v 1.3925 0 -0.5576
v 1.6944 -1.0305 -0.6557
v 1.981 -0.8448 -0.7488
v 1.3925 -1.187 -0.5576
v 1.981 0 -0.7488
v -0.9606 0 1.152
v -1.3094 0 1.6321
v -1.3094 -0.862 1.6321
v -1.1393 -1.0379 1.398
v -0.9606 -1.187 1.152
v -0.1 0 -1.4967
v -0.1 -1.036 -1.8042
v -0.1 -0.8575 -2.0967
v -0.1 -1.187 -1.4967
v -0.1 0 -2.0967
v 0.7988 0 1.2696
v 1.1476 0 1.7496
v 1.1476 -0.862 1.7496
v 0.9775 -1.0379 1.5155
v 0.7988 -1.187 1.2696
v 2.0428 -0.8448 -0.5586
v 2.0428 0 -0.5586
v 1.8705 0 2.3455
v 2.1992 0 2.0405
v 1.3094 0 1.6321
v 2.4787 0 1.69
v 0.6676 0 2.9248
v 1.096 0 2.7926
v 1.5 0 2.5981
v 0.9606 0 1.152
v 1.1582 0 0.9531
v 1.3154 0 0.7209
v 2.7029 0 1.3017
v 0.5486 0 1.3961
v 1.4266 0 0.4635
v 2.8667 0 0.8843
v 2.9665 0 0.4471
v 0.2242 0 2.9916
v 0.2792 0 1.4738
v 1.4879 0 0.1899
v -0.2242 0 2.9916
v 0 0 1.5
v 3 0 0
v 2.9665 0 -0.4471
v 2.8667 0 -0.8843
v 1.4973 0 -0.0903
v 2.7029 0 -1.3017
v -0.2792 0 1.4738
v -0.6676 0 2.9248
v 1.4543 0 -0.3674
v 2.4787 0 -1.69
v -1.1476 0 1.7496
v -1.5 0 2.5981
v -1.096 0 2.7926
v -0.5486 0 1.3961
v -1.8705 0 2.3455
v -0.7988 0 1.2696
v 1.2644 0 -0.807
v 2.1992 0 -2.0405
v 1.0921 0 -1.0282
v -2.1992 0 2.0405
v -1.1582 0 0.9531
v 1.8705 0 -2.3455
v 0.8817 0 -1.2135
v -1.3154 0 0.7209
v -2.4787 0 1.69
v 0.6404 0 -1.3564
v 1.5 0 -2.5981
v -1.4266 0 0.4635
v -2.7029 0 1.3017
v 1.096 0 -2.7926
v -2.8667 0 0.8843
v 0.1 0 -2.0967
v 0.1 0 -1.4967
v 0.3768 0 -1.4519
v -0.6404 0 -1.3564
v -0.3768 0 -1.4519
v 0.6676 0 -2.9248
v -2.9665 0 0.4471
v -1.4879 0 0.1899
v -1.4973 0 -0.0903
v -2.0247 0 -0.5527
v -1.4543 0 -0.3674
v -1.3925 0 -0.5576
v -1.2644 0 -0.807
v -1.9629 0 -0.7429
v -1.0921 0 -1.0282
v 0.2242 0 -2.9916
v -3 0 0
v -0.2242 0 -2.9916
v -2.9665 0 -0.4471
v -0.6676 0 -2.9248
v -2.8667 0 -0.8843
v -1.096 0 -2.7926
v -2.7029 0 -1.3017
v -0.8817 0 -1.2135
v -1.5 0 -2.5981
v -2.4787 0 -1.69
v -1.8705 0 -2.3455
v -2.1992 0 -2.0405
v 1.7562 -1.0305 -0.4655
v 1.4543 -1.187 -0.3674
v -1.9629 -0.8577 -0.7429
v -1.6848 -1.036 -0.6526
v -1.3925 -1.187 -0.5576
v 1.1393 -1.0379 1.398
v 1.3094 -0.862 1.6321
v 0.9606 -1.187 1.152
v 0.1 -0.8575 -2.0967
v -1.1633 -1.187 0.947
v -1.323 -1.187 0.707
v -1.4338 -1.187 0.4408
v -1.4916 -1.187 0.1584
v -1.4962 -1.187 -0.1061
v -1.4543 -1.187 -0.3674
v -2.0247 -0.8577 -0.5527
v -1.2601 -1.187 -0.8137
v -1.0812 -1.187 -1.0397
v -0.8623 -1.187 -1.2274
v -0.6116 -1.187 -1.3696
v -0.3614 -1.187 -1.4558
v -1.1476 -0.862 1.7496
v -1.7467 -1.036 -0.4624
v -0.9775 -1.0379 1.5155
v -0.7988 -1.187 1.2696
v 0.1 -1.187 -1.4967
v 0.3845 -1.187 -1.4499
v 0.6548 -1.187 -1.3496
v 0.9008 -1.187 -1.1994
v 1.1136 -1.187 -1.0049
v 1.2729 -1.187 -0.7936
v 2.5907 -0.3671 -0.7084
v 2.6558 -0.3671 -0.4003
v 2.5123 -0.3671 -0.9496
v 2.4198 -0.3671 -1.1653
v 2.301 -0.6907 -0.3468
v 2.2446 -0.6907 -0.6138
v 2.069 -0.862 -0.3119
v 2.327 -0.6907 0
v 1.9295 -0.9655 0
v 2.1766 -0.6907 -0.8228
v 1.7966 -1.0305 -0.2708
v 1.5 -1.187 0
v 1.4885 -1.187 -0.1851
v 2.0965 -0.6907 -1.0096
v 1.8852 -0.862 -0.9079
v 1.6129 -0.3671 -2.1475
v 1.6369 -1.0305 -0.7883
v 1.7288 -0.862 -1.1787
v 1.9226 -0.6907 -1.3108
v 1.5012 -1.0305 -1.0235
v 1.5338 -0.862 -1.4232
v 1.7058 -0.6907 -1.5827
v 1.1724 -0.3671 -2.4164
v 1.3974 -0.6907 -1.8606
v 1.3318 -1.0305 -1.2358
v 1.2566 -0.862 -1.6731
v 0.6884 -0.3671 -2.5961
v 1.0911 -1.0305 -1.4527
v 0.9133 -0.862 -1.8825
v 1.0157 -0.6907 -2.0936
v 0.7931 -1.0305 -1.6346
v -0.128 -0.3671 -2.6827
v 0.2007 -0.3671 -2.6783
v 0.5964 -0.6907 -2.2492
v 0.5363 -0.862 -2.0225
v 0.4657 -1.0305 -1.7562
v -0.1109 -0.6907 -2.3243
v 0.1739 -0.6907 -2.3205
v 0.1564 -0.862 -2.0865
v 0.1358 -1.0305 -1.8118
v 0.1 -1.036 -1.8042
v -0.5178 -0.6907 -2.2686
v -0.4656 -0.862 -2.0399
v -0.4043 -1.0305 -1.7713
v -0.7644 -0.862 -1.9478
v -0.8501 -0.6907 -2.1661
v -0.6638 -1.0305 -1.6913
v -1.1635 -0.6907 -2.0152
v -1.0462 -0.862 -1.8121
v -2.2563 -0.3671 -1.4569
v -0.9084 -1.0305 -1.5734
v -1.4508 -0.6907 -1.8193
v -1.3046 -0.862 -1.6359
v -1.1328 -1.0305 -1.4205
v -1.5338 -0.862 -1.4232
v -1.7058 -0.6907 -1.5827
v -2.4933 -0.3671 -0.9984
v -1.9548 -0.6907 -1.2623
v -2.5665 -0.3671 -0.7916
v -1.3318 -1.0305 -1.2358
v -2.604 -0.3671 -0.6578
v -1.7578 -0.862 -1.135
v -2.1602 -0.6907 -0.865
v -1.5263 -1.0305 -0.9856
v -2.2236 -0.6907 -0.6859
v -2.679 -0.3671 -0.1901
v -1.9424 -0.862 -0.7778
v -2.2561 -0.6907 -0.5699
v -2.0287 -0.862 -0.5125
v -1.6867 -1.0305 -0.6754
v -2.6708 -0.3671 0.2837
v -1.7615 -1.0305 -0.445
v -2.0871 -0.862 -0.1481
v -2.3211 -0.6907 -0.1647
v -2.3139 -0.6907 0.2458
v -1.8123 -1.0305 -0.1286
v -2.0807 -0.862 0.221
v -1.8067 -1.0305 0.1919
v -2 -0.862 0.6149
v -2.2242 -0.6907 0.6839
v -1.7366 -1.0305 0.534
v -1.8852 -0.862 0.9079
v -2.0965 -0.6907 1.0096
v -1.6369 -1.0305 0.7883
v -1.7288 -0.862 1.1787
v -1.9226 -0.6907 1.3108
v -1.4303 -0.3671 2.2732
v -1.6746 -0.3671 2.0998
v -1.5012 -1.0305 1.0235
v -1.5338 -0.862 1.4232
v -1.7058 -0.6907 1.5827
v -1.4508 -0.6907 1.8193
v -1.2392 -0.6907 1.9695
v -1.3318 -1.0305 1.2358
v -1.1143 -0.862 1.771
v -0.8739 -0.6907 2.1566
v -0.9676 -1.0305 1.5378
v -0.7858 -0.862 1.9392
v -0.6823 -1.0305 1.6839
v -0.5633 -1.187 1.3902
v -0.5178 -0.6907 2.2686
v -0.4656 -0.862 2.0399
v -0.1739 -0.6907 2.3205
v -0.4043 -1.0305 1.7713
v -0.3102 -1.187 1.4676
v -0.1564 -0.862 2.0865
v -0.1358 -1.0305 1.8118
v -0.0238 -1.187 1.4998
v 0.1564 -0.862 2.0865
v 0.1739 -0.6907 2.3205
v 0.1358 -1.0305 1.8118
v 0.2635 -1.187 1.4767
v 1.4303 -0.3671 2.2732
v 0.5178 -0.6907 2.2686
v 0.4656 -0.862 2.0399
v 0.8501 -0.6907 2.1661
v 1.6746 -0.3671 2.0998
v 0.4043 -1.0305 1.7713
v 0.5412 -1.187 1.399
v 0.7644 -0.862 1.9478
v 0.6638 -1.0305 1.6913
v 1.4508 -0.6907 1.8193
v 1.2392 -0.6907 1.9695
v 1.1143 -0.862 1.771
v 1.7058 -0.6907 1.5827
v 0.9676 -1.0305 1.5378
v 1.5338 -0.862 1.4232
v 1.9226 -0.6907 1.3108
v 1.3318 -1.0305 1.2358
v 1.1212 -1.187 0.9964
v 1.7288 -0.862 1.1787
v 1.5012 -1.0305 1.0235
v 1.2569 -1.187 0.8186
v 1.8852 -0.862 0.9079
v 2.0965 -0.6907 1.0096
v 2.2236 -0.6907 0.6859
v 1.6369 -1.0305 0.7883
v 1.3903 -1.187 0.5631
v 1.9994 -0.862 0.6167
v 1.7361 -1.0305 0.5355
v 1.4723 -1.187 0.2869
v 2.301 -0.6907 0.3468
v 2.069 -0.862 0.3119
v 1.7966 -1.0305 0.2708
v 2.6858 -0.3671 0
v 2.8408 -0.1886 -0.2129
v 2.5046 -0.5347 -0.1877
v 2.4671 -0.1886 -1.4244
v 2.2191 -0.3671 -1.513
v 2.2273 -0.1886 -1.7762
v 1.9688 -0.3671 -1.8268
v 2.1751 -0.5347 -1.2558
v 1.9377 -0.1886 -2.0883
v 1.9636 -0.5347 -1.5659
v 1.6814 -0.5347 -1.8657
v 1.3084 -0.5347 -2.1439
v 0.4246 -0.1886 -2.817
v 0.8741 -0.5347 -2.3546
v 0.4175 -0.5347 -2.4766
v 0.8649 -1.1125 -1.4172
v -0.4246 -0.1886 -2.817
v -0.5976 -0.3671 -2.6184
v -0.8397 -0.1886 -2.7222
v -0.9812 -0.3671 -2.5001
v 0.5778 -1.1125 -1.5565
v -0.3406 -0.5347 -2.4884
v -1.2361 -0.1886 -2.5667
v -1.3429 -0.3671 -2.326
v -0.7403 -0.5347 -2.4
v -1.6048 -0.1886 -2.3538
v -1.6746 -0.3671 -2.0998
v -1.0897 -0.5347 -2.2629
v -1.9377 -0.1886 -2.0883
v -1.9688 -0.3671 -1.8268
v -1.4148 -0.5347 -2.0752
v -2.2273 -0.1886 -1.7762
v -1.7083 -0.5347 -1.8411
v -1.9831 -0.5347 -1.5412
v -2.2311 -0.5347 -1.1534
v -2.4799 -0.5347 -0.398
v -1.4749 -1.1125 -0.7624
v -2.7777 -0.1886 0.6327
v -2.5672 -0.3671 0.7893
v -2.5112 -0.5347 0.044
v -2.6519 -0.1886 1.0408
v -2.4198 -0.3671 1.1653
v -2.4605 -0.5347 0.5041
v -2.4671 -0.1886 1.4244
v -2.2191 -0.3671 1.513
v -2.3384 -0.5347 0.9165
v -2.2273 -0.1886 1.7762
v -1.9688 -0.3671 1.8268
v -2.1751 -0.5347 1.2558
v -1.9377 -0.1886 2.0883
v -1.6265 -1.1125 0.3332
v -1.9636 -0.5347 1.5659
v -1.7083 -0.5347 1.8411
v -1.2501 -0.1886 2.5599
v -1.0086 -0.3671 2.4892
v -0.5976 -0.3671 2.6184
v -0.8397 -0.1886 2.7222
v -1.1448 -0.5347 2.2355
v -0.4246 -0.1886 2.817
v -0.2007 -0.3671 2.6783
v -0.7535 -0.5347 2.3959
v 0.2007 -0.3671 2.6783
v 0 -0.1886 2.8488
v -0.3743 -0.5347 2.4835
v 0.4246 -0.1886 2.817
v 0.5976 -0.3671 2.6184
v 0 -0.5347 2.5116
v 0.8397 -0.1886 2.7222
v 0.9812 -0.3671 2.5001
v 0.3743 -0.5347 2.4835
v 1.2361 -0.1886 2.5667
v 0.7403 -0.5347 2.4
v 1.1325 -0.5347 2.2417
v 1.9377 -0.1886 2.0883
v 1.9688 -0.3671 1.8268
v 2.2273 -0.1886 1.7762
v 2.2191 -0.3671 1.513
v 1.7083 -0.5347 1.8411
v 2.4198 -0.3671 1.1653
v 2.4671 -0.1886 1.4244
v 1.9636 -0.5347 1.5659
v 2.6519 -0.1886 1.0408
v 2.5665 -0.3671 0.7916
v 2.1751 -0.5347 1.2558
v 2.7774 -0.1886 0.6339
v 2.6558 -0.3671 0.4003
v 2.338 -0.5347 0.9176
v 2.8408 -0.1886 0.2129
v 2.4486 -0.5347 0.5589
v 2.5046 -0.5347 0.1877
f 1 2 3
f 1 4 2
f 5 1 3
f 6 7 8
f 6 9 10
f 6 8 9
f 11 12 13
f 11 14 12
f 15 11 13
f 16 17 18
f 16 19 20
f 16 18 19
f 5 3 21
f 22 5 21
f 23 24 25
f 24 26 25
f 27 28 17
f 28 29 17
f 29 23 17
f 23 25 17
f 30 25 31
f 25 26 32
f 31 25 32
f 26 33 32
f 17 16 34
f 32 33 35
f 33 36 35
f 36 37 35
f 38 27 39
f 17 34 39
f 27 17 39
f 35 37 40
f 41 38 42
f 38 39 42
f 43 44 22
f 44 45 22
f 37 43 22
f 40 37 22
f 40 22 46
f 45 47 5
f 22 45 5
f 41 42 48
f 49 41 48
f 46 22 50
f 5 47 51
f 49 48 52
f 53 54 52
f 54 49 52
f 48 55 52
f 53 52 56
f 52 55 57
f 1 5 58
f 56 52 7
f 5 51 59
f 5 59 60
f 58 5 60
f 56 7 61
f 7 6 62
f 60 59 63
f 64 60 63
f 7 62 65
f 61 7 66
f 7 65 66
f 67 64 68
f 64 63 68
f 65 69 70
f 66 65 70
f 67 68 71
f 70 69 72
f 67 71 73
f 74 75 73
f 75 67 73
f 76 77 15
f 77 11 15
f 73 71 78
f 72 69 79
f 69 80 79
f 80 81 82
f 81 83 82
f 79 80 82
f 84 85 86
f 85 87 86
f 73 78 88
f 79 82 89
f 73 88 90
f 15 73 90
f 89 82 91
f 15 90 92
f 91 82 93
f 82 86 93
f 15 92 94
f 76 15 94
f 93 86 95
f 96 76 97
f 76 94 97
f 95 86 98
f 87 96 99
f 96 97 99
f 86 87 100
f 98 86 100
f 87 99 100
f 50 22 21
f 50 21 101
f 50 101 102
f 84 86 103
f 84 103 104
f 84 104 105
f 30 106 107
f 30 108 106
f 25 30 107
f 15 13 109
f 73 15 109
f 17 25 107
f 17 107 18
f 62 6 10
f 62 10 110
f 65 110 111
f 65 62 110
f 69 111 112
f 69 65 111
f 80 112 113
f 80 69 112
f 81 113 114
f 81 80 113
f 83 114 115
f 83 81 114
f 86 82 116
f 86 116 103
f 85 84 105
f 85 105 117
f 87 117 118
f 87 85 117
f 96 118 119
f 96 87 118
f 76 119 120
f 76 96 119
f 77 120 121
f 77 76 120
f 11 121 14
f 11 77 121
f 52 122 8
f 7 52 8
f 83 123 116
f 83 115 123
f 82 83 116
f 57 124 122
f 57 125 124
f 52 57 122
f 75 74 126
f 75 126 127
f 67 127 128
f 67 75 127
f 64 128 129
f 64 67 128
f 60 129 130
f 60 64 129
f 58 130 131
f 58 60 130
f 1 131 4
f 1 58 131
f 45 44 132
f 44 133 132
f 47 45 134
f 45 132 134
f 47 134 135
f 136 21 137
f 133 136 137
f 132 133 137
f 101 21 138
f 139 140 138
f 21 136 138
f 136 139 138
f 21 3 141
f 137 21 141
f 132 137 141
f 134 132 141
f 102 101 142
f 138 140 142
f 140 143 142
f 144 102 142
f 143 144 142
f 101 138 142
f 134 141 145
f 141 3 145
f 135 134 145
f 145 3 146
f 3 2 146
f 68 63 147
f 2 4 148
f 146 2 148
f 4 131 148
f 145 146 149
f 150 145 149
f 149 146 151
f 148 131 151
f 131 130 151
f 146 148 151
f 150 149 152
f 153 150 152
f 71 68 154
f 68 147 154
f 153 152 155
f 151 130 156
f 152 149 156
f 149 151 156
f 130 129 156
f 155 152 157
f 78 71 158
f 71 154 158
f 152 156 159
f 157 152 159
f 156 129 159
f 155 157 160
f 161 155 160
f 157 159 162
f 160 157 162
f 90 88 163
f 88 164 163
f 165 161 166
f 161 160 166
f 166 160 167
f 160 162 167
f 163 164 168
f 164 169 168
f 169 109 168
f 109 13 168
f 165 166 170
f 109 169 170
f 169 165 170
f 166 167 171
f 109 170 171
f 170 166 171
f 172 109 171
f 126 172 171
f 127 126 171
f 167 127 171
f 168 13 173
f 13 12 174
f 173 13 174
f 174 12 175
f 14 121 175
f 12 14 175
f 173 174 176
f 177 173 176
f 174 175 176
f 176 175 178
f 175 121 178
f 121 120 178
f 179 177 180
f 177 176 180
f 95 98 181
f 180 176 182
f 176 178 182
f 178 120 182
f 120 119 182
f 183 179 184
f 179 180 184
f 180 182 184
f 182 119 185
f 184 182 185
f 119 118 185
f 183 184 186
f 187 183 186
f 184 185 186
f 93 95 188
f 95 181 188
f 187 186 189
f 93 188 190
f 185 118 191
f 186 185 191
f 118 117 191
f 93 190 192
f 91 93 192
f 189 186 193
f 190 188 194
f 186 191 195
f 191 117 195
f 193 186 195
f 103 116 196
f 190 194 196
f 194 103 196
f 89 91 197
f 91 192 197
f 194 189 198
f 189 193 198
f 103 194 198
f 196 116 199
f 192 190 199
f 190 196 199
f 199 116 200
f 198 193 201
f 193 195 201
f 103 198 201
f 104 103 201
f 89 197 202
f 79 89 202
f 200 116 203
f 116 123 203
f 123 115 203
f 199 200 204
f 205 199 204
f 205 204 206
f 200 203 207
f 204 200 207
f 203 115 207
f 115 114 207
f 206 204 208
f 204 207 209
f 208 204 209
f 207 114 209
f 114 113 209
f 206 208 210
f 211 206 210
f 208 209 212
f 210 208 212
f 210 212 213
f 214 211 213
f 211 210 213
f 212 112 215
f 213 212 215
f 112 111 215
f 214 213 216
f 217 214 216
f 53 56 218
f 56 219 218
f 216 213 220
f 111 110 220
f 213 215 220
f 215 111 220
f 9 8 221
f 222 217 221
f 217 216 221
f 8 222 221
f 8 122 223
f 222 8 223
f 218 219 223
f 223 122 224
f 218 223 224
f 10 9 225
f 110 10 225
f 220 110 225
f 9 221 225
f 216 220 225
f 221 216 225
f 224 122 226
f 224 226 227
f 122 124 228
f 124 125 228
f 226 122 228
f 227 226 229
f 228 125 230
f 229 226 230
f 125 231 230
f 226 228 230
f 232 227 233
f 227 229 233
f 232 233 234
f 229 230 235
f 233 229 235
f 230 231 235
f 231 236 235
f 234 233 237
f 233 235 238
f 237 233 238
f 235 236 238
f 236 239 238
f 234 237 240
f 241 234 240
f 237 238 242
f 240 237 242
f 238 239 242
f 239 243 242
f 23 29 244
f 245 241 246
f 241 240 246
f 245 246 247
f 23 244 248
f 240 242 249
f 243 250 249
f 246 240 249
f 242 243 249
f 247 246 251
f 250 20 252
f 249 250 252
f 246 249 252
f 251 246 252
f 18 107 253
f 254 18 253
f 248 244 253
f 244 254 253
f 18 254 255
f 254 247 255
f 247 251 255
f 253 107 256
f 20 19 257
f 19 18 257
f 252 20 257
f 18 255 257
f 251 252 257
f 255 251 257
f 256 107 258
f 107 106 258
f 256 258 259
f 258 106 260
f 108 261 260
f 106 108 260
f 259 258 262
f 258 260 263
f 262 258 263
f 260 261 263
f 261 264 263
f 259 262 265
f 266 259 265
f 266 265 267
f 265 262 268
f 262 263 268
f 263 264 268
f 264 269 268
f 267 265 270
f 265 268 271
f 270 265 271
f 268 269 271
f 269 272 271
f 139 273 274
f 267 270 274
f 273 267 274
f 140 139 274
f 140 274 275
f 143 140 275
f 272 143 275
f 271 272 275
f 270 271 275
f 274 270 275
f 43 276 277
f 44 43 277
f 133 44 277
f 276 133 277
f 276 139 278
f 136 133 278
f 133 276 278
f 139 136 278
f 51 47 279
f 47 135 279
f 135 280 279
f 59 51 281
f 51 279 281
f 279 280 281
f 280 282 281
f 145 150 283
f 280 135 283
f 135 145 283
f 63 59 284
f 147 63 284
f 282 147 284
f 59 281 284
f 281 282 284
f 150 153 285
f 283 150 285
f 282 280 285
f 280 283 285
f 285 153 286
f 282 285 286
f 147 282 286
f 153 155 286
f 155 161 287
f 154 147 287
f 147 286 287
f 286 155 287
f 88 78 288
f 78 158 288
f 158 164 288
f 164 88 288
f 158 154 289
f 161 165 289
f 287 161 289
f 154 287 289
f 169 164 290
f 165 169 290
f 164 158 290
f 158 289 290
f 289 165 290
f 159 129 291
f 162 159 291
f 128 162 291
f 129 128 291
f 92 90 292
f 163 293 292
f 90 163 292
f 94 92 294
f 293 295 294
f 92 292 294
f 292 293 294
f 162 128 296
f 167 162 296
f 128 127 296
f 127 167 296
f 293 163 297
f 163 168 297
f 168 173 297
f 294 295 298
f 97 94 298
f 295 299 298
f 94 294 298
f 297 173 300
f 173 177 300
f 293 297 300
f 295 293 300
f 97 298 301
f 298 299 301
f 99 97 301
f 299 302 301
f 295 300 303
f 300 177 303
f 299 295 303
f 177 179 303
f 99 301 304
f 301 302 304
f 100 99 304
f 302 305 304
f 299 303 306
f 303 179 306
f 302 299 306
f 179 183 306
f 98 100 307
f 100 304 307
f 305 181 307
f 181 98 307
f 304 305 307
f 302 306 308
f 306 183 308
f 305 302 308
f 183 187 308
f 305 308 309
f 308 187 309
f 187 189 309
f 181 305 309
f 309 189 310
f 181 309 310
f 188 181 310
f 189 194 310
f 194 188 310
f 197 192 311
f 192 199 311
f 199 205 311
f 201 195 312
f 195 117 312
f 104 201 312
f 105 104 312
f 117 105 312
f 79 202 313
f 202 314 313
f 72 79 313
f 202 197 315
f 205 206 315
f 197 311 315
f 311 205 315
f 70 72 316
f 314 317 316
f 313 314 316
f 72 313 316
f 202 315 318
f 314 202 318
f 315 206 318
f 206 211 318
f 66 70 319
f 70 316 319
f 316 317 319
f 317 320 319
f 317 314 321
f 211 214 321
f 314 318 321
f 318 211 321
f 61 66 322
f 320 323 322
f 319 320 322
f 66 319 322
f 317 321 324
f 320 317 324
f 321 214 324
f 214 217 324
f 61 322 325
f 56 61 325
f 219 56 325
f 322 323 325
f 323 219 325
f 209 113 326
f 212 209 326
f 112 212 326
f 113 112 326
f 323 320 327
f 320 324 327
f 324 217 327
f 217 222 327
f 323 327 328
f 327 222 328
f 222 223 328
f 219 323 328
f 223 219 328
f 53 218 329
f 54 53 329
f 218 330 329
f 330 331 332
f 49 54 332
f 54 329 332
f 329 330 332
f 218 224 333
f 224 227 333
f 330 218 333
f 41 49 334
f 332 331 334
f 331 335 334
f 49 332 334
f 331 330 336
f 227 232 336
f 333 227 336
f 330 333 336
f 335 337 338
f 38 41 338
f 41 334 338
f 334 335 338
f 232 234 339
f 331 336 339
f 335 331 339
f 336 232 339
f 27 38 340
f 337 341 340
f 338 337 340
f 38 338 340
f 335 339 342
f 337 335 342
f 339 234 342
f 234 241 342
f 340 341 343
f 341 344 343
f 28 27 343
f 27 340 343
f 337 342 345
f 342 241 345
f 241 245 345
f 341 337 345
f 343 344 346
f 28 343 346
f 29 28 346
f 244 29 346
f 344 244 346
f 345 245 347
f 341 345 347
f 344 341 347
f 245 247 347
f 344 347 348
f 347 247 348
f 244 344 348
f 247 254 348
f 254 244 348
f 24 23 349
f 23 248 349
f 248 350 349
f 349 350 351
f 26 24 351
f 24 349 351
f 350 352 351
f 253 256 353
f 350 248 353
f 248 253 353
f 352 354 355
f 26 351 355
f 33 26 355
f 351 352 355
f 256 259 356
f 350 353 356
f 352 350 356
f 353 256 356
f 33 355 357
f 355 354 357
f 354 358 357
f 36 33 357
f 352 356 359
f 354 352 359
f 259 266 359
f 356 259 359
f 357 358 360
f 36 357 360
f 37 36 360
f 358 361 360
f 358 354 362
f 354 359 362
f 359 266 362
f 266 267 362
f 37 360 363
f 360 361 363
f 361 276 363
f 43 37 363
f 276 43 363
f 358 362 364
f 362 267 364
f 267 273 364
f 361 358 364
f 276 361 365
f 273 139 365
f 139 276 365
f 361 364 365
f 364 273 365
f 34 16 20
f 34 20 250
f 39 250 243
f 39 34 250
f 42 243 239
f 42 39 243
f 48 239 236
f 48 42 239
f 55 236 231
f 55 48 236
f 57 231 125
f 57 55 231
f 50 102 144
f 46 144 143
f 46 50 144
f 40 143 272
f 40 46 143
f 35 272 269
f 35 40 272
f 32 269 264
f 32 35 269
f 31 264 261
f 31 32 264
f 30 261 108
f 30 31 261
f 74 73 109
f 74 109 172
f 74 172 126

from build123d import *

# Parameters (mm, degrees)
TAGLIO_ESTRUSIONE3_DEPTH = 5.500000167


with BuildPart() as part:
    # Schizzo2 → Rivoluzione2 (revolve)
    with BuildSketch(Plane.XY):
        with BuildLine():
            Line((3, 0), (0, 0))
            Line((0, 0), (0, -1.5))
            ThreePointArc((0, -1.5), (1.677059909, -1.104119819), (3, 0))
        make_face()
    revolve(axis=Axis((0, -1.5, 0), (0, 1, 0)))

    # Schizzo3 → Taglio-Estrusione3 (cut, through all)
    with BuildSketch(Plane(origin=(0, -1.5, 0), x_dir=(-1, 0, 0), z_dir=(0, -1, 0))):
        with BuildLine():
            Line((0.1, 2.096662955), (-0.1, 2.096662955))
            Line((-0.1, 2.096662955), (-0.1, 1.496662955))
            ThreePointArc((-0.1, 1.496662955), (-0.881677878, 1.213525492), (-1.392509356, 0.557599939))
            Line((-1.392509356, 0.557599939), (-1.98100003, 0.74881215))
            Line((-1.98100003, 0.74881215), (-2.042803429, 0.558600847))
            Line((-2.042803429, 0.558600847), (-1.454312755, 0.367388636))
            ThreePointArc((-1.454312755, 0.367388636), (-1.426584774, -0.463525492), (-0.960618112, -1.15204724))
            Line((-0.960618112, -1.15204724), (-1.309372877, -1.632066993))
            Line((-1.309372877, -1.632066993), (-1.147569478, -1.749624043))
            Line((-1.147569478, -1.749624043), (-0.798814713, -1.26960429))
            ThreePointArc((-0.798814713, -1.26960429), (0, -1.5), (0.798814713, -1.26960429))
            Line((0.798814713, -1.26960429), (1.147569478, -1.749624043))
            Line((1.147569478, -1.749624043), (1.309372877, -1.632066993))
            Line((1.309372877, -1.632066993), (0.960618112, -1.15204724))
            ThreePointArc((0.960618112, -1.15204724), (1.426584774, -0.463525492), (1.454312755, 0.367388636))
            Line((1.454312755, 0.367388636), (2.024738008, 0.552731036))
            Line((2.024738008, 0.552731036), (1.962934609, 0.742942339))
            Line((1.962934609, 0.742942339), (1.392509356, 0.557599939))
            ThreePointArc((1.392509356, 0.557599939), (0.881677878, 1.213525492), (0.1, 1.496662955))
            Line((0.1, 1.496662955), (0.1, 2.096662955))
        make_face()
    extrude(amount=-TAGLIO_ESTRUSIONE3_DEPTH, mode=Mode.SUBTRACT)


solid = part.part
